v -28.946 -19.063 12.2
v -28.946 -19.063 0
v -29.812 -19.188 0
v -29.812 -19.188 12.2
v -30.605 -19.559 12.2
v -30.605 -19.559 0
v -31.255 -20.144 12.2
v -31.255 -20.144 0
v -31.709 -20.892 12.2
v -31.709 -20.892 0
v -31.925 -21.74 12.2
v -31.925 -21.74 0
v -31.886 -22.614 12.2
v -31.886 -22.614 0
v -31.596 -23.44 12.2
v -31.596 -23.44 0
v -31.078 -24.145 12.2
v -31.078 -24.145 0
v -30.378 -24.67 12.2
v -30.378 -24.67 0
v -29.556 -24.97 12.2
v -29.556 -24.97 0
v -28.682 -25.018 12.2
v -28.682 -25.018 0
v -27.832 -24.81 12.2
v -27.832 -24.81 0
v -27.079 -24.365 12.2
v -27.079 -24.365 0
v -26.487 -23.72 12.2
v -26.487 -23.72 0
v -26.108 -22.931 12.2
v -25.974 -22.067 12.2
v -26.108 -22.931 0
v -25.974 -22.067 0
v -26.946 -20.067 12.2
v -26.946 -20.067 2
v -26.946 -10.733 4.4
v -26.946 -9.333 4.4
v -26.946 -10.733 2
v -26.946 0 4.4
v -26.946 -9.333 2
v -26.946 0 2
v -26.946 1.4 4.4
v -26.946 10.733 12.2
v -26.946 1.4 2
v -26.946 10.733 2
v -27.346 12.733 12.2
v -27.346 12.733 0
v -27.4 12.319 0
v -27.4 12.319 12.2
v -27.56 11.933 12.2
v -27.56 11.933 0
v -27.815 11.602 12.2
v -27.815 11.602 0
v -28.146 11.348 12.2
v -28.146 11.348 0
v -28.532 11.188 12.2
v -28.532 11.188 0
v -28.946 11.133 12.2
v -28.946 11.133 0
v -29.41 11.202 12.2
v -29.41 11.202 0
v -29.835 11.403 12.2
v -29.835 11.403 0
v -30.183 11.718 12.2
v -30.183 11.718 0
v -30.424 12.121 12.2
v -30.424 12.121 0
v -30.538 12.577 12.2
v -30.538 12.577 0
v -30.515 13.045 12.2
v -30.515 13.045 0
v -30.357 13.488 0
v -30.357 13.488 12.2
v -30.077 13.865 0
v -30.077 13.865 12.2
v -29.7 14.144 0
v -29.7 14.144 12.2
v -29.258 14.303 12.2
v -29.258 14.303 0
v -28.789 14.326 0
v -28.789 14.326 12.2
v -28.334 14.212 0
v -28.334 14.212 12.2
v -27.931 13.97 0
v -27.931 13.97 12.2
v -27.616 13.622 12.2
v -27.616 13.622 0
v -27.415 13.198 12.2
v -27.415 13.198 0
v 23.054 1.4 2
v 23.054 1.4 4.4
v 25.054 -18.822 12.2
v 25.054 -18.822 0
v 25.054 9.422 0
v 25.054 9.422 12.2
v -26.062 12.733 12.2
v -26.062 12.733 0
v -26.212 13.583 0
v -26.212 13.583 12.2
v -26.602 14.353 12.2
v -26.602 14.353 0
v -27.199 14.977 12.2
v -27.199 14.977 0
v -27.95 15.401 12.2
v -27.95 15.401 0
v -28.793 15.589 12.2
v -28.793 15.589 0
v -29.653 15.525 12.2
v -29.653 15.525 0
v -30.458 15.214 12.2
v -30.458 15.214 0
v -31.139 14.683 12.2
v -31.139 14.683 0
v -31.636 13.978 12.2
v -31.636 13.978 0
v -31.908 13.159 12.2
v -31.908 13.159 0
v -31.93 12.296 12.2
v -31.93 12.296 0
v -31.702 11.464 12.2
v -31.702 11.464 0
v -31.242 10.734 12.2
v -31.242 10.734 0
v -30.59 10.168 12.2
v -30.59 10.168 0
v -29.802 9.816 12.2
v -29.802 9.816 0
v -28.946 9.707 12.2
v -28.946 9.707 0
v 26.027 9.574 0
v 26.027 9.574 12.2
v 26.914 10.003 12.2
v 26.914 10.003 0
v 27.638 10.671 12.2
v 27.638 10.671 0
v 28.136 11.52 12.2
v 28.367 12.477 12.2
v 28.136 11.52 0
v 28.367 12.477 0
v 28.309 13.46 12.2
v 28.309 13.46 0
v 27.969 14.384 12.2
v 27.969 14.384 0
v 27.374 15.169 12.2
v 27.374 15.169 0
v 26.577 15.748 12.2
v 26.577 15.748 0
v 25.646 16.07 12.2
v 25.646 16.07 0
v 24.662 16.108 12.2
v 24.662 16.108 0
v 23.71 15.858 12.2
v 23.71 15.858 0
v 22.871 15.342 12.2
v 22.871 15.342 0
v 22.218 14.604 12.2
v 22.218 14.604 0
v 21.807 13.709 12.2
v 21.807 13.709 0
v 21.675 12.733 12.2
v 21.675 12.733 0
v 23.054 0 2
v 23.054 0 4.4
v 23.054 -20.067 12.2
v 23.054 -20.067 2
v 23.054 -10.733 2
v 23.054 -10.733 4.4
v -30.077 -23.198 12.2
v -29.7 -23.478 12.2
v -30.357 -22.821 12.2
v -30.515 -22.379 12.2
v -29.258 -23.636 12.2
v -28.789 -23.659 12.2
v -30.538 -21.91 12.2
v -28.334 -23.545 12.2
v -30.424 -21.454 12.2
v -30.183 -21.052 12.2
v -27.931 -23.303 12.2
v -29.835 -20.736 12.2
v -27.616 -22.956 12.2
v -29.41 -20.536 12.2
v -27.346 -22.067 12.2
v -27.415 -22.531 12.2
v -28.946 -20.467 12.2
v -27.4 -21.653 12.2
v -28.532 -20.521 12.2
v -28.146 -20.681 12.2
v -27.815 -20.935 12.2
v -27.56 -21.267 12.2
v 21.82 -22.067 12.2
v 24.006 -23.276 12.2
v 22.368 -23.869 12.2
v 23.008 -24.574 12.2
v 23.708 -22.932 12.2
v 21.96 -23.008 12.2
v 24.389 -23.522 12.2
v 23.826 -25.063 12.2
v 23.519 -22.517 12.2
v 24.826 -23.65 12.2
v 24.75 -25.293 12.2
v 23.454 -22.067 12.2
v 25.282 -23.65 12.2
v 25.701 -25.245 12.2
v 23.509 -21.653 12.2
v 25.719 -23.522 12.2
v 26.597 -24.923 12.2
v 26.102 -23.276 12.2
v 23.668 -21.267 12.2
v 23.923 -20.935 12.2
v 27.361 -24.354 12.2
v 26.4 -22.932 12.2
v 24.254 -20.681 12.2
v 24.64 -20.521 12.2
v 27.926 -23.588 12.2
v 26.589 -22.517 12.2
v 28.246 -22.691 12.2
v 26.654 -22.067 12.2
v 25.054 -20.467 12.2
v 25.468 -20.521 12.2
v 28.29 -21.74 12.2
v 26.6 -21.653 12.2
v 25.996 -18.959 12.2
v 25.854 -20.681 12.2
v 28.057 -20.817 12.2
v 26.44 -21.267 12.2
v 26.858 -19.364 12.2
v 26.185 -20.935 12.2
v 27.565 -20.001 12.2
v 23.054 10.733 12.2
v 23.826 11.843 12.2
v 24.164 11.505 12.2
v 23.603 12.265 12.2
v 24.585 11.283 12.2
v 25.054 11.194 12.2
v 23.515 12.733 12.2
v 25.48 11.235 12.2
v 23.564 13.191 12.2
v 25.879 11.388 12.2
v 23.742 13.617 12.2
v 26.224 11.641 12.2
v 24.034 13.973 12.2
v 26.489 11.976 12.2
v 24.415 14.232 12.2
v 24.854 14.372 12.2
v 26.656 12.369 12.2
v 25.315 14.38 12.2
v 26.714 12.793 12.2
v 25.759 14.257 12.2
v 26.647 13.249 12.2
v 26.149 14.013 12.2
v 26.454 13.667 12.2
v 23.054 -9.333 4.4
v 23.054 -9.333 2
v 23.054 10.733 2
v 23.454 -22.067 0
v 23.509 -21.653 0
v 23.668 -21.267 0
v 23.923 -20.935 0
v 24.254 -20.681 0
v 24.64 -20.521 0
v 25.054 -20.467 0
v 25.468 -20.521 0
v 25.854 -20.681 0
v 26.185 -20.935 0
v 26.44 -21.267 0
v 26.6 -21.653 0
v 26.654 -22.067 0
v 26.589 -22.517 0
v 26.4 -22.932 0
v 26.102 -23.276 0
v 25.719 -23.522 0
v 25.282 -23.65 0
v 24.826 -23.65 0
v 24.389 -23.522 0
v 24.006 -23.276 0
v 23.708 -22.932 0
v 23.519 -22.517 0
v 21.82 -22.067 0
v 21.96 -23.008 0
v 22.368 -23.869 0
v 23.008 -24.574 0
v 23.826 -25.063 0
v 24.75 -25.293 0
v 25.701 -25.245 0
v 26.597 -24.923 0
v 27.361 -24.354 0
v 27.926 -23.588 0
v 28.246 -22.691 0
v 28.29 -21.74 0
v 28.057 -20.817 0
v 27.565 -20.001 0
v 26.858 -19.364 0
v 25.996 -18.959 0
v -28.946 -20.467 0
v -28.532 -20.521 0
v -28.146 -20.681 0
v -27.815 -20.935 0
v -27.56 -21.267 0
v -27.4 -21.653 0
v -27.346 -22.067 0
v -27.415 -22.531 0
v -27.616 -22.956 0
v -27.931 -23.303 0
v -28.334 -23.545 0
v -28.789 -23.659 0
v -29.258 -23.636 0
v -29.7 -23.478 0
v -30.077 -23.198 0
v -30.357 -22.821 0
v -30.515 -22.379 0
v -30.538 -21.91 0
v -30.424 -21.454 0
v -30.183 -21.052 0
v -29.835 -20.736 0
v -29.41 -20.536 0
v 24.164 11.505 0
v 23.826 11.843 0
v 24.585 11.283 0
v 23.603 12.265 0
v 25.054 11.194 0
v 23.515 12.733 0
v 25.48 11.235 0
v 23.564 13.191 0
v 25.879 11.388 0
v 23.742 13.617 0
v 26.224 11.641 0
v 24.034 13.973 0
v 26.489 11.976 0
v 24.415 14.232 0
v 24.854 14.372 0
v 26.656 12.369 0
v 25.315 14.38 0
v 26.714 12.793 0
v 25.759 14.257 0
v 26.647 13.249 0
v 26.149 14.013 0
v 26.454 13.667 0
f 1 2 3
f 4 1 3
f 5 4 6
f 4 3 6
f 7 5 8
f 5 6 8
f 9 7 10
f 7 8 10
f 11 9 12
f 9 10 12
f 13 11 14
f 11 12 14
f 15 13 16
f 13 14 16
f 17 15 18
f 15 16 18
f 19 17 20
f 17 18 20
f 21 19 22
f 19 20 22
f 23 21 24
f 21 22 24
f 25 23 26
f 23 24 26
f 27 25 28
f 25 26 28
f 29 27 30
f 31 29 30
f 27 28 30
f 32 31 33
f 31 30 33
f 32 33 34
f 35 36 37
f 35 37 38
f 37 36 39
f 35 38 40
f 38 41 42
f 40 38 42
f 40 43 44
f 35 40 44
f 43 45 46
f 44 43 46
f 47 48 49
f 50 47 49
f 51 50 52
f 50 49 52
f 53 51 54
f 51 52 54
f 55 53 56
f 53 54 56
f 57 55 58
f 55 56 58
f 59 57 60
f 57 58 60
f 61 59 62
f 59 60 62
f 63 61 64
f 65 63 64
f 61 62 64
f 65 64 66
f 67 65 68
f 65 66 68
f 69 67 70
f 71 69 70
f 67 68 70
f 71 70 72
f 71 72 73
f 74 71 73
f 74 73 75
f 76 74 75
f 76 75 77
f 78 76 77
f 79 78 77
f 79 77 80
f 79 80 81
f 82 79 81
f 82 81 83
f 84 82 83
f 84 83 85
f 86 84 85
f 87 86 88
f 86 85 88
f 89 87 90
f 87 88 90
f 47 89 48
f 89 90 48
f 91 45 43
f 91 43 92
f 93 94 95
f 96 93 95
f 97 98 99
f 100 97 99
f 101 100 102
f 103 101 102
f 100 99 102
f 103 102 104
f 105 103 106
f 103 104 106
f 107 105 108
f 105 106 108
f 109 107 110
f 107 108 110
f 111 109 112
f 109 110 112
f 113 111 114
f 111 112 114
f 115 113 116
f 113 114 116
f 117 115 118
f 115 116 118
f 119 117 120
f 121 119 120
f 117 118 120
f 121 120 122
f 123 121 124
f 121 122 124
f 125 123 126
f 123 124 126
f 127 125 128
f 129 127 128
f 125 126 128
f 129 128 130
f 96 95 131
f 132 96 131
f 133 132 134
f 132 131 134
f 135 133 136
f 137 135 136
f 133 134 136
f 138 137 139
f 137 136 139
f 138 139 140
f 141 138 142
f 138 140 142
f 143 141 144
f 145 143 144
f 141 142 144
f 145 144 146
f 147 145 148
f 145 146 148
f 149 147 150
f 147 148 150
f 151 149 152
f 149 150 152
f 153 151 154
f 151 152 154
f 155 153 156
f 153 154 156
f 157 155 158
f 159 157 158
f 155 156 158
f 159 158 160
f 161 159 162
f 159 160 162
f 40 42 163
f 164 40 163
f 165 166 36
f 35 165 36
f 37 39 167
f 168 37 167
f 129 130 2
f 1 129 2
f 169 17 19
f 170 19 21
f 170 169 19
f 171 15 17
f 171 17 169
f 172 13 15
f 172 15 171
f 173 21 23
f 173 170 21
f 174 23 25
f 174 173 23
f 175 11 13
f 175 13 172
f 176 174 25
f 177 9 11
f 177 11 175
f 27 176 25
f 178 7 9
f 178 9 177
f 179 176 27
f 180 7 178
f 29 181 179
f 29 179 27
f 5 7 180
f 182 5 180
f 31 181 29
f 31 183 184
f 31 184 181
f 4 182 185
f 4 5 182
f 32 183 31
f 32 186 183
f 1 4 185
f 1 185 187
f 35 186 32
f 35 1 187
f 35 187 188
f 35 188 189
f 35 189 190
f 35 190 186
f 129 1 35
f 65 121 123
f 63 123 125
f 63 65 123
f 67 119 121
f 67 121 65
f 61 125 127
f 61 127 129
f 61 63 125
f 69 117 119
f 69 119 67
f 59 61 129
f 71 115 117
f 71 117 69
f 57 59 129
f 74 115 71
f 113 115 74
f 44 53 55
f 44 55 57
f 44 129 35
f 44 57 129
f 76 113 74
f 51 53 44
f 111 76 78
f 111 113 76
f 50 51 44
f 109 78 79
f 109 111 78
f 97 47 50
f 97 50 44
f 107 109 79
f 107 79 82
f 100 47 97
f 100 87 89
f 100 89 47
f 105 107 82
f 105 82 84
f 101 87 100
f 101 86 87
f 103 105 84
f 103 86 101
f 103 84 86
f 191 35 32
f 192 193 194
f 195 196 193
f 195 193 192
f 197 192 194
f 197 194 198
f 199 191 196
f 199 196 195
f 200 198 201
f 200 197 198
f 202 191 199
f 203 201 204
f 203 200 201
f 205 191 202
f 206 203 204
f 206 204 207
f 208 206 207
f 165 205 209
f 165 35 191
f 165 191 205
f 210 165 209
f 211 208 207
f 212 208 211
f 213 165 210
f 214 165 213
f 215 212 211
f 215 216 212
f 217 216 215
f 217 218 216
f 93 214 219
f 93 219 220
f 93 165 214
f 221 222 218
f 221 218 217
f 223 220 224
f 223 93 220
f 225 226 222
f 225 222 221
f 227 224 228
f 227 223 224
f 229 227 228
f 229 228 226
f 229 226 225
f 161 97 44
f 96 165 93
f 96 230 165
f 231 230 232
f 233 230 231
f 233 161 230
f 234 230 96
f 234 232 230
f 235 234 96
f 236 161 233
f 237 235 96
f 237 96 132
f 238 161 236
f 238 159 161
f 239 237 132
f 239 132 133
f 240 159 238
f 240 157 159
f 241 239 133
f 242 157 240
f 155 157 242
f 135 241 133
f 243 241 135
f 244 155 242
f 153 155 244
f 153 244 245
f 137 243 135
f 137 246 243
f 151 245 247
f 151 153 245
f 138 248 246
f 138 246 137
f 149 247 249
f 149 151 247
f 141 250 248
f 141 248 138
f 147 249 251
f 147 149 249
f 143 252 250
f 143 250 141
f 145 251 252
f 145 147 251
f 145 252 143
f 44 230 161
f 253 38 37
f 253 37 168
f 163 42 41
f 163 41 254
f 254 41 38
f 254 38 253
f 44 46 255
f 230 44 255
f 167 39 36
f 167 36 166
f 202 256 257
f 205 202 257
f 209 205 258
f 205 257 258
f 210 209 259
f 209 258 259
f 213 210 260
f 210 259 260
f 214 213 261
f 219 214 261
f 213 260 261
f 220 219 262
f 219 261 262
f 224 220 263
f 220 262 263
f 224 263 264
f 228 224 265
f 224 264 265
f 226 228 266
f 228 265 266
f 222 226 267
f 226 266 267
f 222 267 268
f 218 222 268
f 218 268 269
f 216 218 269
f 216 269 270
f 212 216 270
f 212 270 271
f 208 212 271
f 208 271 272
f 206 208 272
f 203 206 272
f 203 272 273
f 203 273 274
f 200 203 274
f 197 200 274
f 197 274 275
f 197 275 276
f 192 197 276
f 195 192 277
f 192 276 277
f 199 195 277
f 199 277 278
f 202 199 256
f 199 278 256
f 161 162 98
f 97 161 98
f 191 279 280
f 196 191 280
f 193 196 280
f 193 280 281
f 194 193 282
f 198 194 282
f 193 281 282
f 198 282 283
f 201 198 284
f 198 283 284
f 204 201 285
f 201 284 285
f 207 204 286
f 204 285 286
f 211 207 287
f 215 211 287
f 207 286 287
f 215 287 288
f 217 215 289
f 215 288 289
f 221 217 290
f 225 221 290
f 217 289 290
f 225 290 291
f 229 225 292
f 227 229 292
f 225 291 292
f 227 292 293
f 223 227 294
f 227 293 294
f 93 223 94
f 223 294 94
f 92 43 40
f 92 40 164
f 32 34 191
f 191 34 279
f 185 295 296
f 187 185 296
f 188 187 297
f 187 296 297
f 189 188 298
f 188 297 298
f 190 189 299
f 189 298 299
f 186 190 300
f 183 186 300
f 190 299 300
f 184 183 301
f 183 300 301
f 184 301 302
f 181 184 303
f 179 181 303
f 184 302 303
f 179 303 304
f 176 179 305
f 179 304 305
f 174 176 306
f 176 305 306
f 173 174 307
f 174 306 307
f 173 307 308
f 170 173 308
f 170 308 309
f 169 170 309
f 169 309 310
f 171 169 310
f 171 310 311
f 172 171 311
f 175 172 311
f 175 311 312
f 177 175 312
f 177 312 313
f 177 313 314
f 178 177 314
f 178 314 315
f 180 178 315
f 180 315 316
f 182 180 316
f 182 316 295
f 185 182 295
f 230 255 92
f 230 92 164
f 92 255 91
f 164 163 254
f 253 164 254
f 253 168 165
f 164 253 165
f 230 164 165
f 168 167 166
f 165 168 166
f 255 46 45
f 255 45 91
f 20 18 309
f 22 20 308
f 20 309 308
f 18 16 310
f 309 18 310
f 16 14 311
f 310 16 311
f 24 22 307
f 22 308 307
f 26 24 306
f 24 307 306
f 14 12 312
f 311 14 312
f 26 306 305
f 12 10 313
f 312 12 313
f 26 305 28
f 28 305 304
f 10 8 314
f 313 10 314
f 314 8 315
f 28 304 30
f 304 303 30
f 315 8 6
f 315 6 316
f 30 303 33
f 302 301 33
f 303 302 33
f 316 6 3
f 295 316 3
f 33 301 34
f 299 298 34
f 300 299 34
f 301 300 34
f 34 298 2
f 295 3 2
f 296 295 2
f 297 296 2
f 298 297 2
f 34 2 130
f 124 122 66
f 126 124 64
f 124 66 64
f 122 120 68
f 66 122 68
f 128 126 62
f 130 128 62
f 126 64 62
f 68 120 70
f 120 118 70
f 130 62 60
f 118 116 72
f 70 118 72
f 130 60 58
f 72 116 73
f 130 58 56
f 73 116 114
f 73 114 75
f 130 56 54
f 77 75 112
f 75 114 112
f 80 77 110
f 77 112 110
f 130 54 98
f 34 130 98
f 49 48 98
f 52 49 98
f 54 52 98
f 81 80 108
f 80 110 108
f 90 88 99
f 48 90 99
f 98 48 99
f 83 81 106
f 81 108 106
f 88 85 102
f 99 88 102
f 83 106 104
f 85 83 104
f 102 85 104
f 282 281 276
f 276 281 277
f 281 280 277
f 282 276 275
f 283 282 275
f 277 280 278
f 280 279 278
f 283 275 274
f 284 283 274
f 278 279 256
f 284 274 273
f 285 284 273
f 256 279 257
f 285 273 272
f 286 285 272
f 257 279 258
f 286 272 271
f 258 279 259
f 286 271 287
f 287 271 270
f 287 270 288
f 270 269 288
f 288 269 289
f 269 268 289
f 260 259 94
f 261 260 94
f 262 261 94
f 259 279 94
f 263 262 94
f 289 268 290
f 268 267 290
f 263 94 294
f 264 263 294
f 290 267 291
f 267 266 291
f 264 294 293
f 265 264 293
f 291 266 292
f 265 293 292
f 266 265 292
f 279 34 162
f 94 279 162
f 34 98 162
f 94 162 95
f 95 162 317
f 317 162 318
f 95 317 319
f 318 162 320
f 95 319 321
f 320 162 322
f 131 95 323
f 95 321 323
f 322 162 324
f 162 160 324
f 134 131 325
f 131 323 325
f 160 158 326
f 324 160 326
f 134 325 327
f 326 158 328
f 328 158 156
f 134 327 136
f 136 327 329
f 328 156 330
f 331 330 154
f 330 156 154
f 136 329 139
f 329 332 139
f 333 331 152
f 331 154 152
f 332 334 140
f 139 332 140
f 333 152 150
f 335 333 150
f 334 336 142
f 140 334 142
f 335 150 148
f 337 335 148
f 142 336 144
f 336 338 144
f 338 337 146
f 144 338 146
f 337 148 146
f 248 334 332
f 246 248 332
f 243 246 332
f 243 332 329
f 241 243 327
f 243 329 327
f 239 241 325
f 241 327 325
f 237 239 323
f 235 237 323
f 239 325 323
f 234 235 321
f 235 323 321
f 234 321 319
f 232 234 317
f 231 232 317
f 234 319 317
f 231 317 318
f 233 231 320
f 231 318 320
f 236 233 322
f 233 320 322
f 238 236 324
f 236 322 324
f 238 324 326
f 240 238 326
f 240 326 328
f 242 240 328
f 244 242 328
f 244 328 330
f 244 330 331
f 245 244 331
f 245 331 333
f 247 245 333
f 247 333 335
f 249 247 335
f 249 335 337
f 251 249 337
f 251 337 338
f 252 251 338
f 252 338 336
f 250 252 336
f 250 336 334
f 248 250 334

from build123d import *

# Parameters (mm, degrees)
F0_W     = 50
F0_H     = 1.4
F0_H_2   = 9.33334
F0_H_3   = 9.33333
F0_W_2   = 2
F1_DEPTH = 2
F2_DEPTH = 12.2
F3_DEPTH = 4.4


with BuildPart() as f1:
    # F0 (on Top) → F1 (new body)
    with BuildSketch(Plane.XY):
        with BuildLine():
            ThreePointArc((21.8201372772, -22.06666), (27.3605822843, -24.3541997855), (25.0540951786, -18.8216157258))
            Line((25.0540951786, -18.8216157258), (25.0540951786, -20.06666))
            Line((25.0540951786, -20.06666), (25.0540951786, -20.46666))
            ThreePointArc((25.0540951786, -20.46666), (26.1854660285, -20.9352891501), (26.6540951786, -22.06666))
            ThreePointArc((26.6540951786, -22.06666), (25.0540951786, -23.66666), (23.4540951786, -22.06666))
            Line((23.4540951786, -22.06666), (23.0540951786, -22.06666))
            Line((23.0540951786, -22.06666), (21.8201372772, -22.06666))
        make_face()
        with Locations((-1.9459048214, 0.7)):
            Rectangle(F0_W, F0_H)
        with BuildLine():
            Line((-26.9459048214, 12.73334), (-27.3459048214, 12.73334))
            ThreePointArc((-27.3459048214, 12.73334), (-27.8145339715, 11.6019691501), (-28.9459048214, 11.13334))
            Line((-28.9459048214, 11.13334), (-28.9459048214, 10.73334))
            Line((-28.9459048214, 10.73334), (-26.9459048214, 10.73334))
            Line((-26.9459048214, 10.73334), (-26.9459048214, 12.73334))
        make_face()
        with BuildLine():
            Line((-26.9459048214, -22.06666), (-26.9459048214, -20.06666))
            Line((-26.9459048214, -20.06666), (-28.9459048214, -20.06666))
            Line((-28.9459048214, -20.06666), (-28.9459048214, -20.46666))
            ThreePointArc((-28.9459048214, -20.46666), (-27.8145339715, -20.9352891501), (-27.3459048214, -22.06666))
            Line((-27.3459048214, -22.06666), (-26.9459048214, -22.06666))
        make_face()
        with BuildLine():
            Line((23.0540951786, 12.73334), (23.0540951786, 10.73334))
            Line((23.0540951786, 10.73334), (25.0540951786, 10.73334))
            Line((25.0540951786, 10.73334), (25.0540951786, 11.1939641141))
            ThreePointArc((25.0540951786, 11.1939641141), (23.9822411075, 11.6614859288), (23.5147192927, 12.73334))
            Line((23.5147192927, 12.73334), (23.0540951786, 12.73334))
        make_face()
        with Locations((-1.9459048214, 6.06667)):
            Rectangle(F0_W, F0_H_2)
        Polygon((-26.9459048214, 10.73334), (-28.9459048214, 10.73334), (-28.9459048214, 9.7067784518), (-28.9459048214, 1.4), (-26.9459048214, 1.4), align=None)
        with Locations((-1.9459048214, -4.666665)):
            Rectangle(F0_W, F0_H_3)
        with BuildLine():
            ThreePointArc((25.0540951786, 9.4220731407), (27.3739572404, 15.169460212), (21.67487517, 12.73334))
            Line((21.67487517, 12.73334), (23.0540951786, 12.73334))
            Line((23.0540951786, 12.73334), (23.5147192927, 12.73334))
            ThreePointArc((23.5147192927, 12.73334), (25.0838484178, 14.3925799209), (26.7136119574, 12.7928567787))
            ThreePointArc((26.7136119574, 12.7928567787), (26.2237410386, 11.6406356962), (25.0540951786, 11.1939641141))
            Line((25.0540951786, 11.1939641141), (25.0540951786, 10.73334))
            Line((25.0540951786, 10.73334), (25.0540951786, 9.4220731407))
        make_face()
        with Locations((24.0540951786, -10.03333)):
            Rectangle(F0_W_2, F0_H)
        with BuildLine():
            ThreePointArc((-28.9459048214, 11.13334), (-30.0772756713, 13.8647108499), (-27.3459048214, 12.73334))
            Line((-27.3459048214, 12.73334), (-26.9459048214, 12.73334))
            Line((-26.9459048214, 12.73334), (-26.0620750487, 12.73334))
            ThreePointArc((-26.0620750487, 12.73334), (-31.1388180647, 14.6834699023), (-28.9459048214, 9.7067784518))
            Line((-28.9459048214, 9.7067784518), (-28.9459048214, 10.73334))
            Line((-28.9459048214, 10.73334), (-28.9459048214, 11.13334))
        make_face()
        with BuildLine():
            Line((-28.9459048214, -20.06666), (-28.9459048214, -19.0631560981))
            ThreePointArc((-28.9459048214, -19.0631560981), (-31.0781165452, -24.1453706629), (-25.9737856686, -22.06666))
            Line((-25.9737856686, -22.06666), (-26.9459048214, -22.06666))
            Line((-26.9459048214, -22.06666), (-27.3459048214, -22.06666))
            ThreePointArc((-27.3459048214, -22.06666), (-30.0772756713, -23.1980308499), (-28.9459048214, -20.46666))
            Line((-28.9459048214, -20.46666), (-28.9459048214, -20.06666))
        make_face()
        Polygon((-26.0620750487, 12.73334), (-26.9459048214, 12.73334), (-26.9459048214, 10.73334), (23.0540951786, 10.73334), (23.0540951786, 12.73334), (21.67487517, 12.73334), align=None)
        Polygon((23.0540951786, -20.06666), (-26.9459048214, -20.06666), (-26.9459048214, -22.06666), (-25.9737856686, -22.06666), (21.8201372772, -22.06666), (23.0540951786, -22.06666), align=None)
        with Locations((-27.9459048214, 0.7)):
            Rectangle(F0_W_2, F0_H)
        with Locations((24.0540951786, 0.7)):
            Rectangle(F0_W_2, F0_H)
        with Locations((-27.9459048214, -4.666665)):
            Rectangle(F0_W_2, F0_H_3)
        with Locations((24.0540951786, -4.666665)):
            Rectangle(F0_W_2, F0_H_3)
        with Locations((-27.9459048214, -10.03333)):
            Rectangle(F0_W_2, F0_H)
        with Locations((-1.9459048214, -15.399995)):
            Rectangle(F0_W, F0_H_3)
        with BuildLine():
            Line((25.0540951786, -20.06666), (23.0540951786, -20.06666))
            Line((23.0540951786, -20.06666), (23.0540951786, -22.06666))
            Line((23.0540951786, -22.06666), (23.4540951786, -22.06666))
            ThreePointArc((23.4540951786, -22.06666), (23.9227243287, -20.9352891501), (25.0540951786, -20.46666))
            Line((25.0540951786, -20.46666), (25.0540951786, -20.06666))
        make_face()
        Polygon((-26.9459048214, -20.06666), (-26.9459048214, -10.73333), (-28.9459048214, -10.73333), (-28.9459048214, -19.0631560981), (-28.9459048214, -20.06666), align=None)
        Polygon((25.0540951786, 10.73334), (23.0540951786, 10.73334), (23.0540951786, 1.4), (25.0540951786, 1.4), (25.0540951786, 9.4220731407), align=None)
        with Locations((-1.9459048214, -10.03333)):
            Rectangle(F0_W, F0_H)
        Polygon((25.0540951786, -10.73333), (23.0540951786, -10.73333), (23.0540951786, -20.06666), (25.0540951786, -20.06666), (25.0540951786, -18.8216157258), align=None)
    extrude(amount=F1_DEPTH)

    # F0 (on Top) → F2 (join)
    with BuildSketch(Plane.XY):
        Polygon((-26.0620750487, 12.73334), (-26.9459048214, 12.73334), (-26.9459048214, 10.73334), (23.0540951786, 10.73334), (23.0540951786, 12.73334), (21.67487517, 12.73334), align=None)
        Polygon((-26.9459048214, 10.73334), (-28.9459048214, 10.73334), (-28.9459048214, 9.7067784518), (-28.9459048214, 1.4), (-26.9459048214, 1.4), align=None)
        with Locations((-27.9459048214, -4.666665)):
            Rectangle(F0_W_2, F0_H_3)
        Polygon((-26.9459048214, -20.06666), (-26.9459048214, -10.73333), (-28.9459048214, -10.73333), (-28.9459048214, -19.0631560981), (-28.9459048214, -20.06666), align=None)
        Polygon((23.0540951786, -20.06666), (-26.9459048214, -20.06666), (-26.9459048214, -22.06666), (-25.9737856686, -22.06666), (21.8201372772, -22.06666), (23.0540951786, -22.06666), align=None)
        Polygon((25.0540951786, -10.73333), (23.0540951786, -10.73333), (23.0540951786, -20.06666), (25.0540951786, -20.06666), (25.0540951786, -18.8216157258), align=None)
        with Locations((24.0540951786, -4.666665)):
            Rectangle(F0_W_2, F0_H_3)
        with Locations((24.0540951786, -10.03333)):
            Rectangle(F0_W_2, F0_H)
        with Locations((-27.9459048214, -10.03333)):
            Rectangle(F0_W_2, F0_H)
        Polygon((25.0540951786, 10.73334), (23.0540951786, 10.73334), (23.0540951786, 1.4), (25.0540951786, 1.4), (25.0540951786, 9.4220731407), align=None)
        with Locations((24.0540951786, 0.7)):
            Rectangle(F0_W_2, F0_H)
        with Locations((-27.9459048214, 0.7)):
            Rectangle(F0_W_2, F0_H)
        with BuildLine():
            ThreePointArc((25.0540951786, 9.4220731407), (27.3739572404, 15.169460212), (21.67487517, 12.73334))
            Line((21.67487517, 12.73334), (23.0540951786, 12.73334))
            Line((23.0540951786, 12.73334), (23.5147192927, 12.73334))
            ThreePointArc((23.5147192927, 12.73334), (25.0838484178, 14.3925799209), (26.7136119574, 12.7928567787))
            ThreePointArc((26.7136119574, 12.7928567787), (26.2237410386, 11.6406356962), (25.0540951786, 11.1939641141))
            Line((25.0540951786, 11.1939641141), (25.0540951786, 10.73334))
            Line((25.0540951786, 10.73334), (25.0540951786, 9.4220731407))
        make_face()
        with BuildLine():
            ThreePointArc((21.8201372772, -22.06666), (27.3605822843, -24.3541997855), (25.0540951786, -18.8216157258))
            Line((25.0540951786, -18.8216157258), (25.0540951786, -20.06666))
            Line((25.0540951786, -20.06666), (25.0540951786, -20.46666))
            ThreePointArc((25.0540951786, -20.46666), (26.1854660285, -20.9352891501), (26.6540951786, -22.06666))
            ThreePointArc((26.6540951786, -22.06666), (25.0540951786, -23.66666), (23.4540951786, -22.06666))
            Line((23.4540951786, -22.06666), (23.0540951786, -22.06666))
            Line((23.0540951786, -22.06666), (21.8201372772, -22.06666))
        make_face()
        with BuildLine():
            Line((25.0540951786, -20.06666), (23.0540951786, -20.06666))
            Line((23.0540951786, -20.06666), (23.0540951786, -22.06666))
            Line((23.0540951786, -22.06666), (23.4540951786, -22.06666))
            ThreePointArc((23.4540951786, -22.06666), (23.9227243287, -20.9352891501), (25.0540951786, -20.46666))
            Line((25.0540951786, -20.46666), (25.0540951786, -20.06666))
        make_face()
        with BuildLine():
            Line((23.0540951786, 12.73334), (23.0540951786, 10.73334))
            Line((23.0540951786, 10.73334), (25.0540951786, 10.73334))
            Line((25.0540951786, 10.73334), (25.0540951786, 11.1939641141))
            ThreePointArc((25.0540951786, 11.1939641141), (23.9822411075, 11.6614859288), (23.5147192927, 12.73334))
            Line((23.5147192927, 12.73334), (23.0540951786, 12.73334))
        make_face()
        with BuildLine():
            Line((-26.9459048214, -22.06666), (-26.9459048214, -20.06666))
            Line((-26.9459048214, -20.06666), (-28.9459048214, -20.06666))
            Line((-28.9459048214, -20.06666), (-28.9459048214, -20.46666))
            ThreePointArc((-28.9459048214, -20.46666), (-27.8145339715, -20.9352891501), (-27.3459048214, -22.06666))
            Line((-27.3459048214, -22.06666), (-26.9459048214, -22.06666))
        make_face()
        with BuildLine():
            Line((-28.9459048214, -20.06666), (-28.9459048214, -19.0631560981))
            ThreePointArc((-28.9459048214, -19.0631560981), (-31.0781165452, -24.1453706629), (-25.9737856686, -22.06666))
            Line((-25.9737856686, -22.06666), (-26.9459048214, -22.06666))
            Line((-26.9459048214, -22.06666), (-27.3459048214, -22.06666))
            ThreePointArc((-27.3459048214, -22.06666), (-30.0772756713, -23.1980308499), (-28.9459048214, -20.46666))
            Line((-28.9459048214, -20.46666), (-28.9459048214, -20.06666))
        make_face()
        with BuildLine():
            ThreePointArc((-28.9459048214, 11.13334), (-30.0772756713, 13.8647108499), (-27.3459048214, 12.73334))
            Line((-27.3459048214, 12.73334), (-26.9459048214, 12.73334))
            Line((-26.9459048214, 12.73334), (-26.0620750487, 12.73334))
            ThreePointArc((-26.0620750487, 12.73334), (-31.1388180647, 14.6834699023), (-28.9459048214, 9.7067784518))
            Line((-28.9459048214, 9.7067784518), (-28.9459048214, 10.73334))
            Line((-28.9459048214, 10.73334), (-28.9459048214, 11.13334))
        make_face()
        with BuildLine():
            Line((-26.9459048214, 12.73334), (-27.3459048214, 12.73334))
            ThreePointArc((-27.3459048214, 12.73334), (-27.8145339715, 11.6019691501), (-28.9459048214, 11.13334))
            Line((-28.9459048214, 11.13334), (-28.9459048214, 10.73334))
            Line((-28.9459048214, 10.73334), (-26.9459048214, 10.73334))
            Line((-26.9459048214, 10.73334), (-26.9459048214, 12.73334))
        make_face()
    extrude(amount=F2_DEPTH)

    # F0 (on Top) → F3 (join)
    with BuildSketch(Plane.XY):
        with Locations((-1.9459048214, 0.7)):
            Rectangle(F0_W, F0_H)
        with Locations((-1.9459048214, -10.03333)):
            Rectangle(F0_W, F0_H)
    extrude(amount=F3_DEPTH)


solid = f1.part
